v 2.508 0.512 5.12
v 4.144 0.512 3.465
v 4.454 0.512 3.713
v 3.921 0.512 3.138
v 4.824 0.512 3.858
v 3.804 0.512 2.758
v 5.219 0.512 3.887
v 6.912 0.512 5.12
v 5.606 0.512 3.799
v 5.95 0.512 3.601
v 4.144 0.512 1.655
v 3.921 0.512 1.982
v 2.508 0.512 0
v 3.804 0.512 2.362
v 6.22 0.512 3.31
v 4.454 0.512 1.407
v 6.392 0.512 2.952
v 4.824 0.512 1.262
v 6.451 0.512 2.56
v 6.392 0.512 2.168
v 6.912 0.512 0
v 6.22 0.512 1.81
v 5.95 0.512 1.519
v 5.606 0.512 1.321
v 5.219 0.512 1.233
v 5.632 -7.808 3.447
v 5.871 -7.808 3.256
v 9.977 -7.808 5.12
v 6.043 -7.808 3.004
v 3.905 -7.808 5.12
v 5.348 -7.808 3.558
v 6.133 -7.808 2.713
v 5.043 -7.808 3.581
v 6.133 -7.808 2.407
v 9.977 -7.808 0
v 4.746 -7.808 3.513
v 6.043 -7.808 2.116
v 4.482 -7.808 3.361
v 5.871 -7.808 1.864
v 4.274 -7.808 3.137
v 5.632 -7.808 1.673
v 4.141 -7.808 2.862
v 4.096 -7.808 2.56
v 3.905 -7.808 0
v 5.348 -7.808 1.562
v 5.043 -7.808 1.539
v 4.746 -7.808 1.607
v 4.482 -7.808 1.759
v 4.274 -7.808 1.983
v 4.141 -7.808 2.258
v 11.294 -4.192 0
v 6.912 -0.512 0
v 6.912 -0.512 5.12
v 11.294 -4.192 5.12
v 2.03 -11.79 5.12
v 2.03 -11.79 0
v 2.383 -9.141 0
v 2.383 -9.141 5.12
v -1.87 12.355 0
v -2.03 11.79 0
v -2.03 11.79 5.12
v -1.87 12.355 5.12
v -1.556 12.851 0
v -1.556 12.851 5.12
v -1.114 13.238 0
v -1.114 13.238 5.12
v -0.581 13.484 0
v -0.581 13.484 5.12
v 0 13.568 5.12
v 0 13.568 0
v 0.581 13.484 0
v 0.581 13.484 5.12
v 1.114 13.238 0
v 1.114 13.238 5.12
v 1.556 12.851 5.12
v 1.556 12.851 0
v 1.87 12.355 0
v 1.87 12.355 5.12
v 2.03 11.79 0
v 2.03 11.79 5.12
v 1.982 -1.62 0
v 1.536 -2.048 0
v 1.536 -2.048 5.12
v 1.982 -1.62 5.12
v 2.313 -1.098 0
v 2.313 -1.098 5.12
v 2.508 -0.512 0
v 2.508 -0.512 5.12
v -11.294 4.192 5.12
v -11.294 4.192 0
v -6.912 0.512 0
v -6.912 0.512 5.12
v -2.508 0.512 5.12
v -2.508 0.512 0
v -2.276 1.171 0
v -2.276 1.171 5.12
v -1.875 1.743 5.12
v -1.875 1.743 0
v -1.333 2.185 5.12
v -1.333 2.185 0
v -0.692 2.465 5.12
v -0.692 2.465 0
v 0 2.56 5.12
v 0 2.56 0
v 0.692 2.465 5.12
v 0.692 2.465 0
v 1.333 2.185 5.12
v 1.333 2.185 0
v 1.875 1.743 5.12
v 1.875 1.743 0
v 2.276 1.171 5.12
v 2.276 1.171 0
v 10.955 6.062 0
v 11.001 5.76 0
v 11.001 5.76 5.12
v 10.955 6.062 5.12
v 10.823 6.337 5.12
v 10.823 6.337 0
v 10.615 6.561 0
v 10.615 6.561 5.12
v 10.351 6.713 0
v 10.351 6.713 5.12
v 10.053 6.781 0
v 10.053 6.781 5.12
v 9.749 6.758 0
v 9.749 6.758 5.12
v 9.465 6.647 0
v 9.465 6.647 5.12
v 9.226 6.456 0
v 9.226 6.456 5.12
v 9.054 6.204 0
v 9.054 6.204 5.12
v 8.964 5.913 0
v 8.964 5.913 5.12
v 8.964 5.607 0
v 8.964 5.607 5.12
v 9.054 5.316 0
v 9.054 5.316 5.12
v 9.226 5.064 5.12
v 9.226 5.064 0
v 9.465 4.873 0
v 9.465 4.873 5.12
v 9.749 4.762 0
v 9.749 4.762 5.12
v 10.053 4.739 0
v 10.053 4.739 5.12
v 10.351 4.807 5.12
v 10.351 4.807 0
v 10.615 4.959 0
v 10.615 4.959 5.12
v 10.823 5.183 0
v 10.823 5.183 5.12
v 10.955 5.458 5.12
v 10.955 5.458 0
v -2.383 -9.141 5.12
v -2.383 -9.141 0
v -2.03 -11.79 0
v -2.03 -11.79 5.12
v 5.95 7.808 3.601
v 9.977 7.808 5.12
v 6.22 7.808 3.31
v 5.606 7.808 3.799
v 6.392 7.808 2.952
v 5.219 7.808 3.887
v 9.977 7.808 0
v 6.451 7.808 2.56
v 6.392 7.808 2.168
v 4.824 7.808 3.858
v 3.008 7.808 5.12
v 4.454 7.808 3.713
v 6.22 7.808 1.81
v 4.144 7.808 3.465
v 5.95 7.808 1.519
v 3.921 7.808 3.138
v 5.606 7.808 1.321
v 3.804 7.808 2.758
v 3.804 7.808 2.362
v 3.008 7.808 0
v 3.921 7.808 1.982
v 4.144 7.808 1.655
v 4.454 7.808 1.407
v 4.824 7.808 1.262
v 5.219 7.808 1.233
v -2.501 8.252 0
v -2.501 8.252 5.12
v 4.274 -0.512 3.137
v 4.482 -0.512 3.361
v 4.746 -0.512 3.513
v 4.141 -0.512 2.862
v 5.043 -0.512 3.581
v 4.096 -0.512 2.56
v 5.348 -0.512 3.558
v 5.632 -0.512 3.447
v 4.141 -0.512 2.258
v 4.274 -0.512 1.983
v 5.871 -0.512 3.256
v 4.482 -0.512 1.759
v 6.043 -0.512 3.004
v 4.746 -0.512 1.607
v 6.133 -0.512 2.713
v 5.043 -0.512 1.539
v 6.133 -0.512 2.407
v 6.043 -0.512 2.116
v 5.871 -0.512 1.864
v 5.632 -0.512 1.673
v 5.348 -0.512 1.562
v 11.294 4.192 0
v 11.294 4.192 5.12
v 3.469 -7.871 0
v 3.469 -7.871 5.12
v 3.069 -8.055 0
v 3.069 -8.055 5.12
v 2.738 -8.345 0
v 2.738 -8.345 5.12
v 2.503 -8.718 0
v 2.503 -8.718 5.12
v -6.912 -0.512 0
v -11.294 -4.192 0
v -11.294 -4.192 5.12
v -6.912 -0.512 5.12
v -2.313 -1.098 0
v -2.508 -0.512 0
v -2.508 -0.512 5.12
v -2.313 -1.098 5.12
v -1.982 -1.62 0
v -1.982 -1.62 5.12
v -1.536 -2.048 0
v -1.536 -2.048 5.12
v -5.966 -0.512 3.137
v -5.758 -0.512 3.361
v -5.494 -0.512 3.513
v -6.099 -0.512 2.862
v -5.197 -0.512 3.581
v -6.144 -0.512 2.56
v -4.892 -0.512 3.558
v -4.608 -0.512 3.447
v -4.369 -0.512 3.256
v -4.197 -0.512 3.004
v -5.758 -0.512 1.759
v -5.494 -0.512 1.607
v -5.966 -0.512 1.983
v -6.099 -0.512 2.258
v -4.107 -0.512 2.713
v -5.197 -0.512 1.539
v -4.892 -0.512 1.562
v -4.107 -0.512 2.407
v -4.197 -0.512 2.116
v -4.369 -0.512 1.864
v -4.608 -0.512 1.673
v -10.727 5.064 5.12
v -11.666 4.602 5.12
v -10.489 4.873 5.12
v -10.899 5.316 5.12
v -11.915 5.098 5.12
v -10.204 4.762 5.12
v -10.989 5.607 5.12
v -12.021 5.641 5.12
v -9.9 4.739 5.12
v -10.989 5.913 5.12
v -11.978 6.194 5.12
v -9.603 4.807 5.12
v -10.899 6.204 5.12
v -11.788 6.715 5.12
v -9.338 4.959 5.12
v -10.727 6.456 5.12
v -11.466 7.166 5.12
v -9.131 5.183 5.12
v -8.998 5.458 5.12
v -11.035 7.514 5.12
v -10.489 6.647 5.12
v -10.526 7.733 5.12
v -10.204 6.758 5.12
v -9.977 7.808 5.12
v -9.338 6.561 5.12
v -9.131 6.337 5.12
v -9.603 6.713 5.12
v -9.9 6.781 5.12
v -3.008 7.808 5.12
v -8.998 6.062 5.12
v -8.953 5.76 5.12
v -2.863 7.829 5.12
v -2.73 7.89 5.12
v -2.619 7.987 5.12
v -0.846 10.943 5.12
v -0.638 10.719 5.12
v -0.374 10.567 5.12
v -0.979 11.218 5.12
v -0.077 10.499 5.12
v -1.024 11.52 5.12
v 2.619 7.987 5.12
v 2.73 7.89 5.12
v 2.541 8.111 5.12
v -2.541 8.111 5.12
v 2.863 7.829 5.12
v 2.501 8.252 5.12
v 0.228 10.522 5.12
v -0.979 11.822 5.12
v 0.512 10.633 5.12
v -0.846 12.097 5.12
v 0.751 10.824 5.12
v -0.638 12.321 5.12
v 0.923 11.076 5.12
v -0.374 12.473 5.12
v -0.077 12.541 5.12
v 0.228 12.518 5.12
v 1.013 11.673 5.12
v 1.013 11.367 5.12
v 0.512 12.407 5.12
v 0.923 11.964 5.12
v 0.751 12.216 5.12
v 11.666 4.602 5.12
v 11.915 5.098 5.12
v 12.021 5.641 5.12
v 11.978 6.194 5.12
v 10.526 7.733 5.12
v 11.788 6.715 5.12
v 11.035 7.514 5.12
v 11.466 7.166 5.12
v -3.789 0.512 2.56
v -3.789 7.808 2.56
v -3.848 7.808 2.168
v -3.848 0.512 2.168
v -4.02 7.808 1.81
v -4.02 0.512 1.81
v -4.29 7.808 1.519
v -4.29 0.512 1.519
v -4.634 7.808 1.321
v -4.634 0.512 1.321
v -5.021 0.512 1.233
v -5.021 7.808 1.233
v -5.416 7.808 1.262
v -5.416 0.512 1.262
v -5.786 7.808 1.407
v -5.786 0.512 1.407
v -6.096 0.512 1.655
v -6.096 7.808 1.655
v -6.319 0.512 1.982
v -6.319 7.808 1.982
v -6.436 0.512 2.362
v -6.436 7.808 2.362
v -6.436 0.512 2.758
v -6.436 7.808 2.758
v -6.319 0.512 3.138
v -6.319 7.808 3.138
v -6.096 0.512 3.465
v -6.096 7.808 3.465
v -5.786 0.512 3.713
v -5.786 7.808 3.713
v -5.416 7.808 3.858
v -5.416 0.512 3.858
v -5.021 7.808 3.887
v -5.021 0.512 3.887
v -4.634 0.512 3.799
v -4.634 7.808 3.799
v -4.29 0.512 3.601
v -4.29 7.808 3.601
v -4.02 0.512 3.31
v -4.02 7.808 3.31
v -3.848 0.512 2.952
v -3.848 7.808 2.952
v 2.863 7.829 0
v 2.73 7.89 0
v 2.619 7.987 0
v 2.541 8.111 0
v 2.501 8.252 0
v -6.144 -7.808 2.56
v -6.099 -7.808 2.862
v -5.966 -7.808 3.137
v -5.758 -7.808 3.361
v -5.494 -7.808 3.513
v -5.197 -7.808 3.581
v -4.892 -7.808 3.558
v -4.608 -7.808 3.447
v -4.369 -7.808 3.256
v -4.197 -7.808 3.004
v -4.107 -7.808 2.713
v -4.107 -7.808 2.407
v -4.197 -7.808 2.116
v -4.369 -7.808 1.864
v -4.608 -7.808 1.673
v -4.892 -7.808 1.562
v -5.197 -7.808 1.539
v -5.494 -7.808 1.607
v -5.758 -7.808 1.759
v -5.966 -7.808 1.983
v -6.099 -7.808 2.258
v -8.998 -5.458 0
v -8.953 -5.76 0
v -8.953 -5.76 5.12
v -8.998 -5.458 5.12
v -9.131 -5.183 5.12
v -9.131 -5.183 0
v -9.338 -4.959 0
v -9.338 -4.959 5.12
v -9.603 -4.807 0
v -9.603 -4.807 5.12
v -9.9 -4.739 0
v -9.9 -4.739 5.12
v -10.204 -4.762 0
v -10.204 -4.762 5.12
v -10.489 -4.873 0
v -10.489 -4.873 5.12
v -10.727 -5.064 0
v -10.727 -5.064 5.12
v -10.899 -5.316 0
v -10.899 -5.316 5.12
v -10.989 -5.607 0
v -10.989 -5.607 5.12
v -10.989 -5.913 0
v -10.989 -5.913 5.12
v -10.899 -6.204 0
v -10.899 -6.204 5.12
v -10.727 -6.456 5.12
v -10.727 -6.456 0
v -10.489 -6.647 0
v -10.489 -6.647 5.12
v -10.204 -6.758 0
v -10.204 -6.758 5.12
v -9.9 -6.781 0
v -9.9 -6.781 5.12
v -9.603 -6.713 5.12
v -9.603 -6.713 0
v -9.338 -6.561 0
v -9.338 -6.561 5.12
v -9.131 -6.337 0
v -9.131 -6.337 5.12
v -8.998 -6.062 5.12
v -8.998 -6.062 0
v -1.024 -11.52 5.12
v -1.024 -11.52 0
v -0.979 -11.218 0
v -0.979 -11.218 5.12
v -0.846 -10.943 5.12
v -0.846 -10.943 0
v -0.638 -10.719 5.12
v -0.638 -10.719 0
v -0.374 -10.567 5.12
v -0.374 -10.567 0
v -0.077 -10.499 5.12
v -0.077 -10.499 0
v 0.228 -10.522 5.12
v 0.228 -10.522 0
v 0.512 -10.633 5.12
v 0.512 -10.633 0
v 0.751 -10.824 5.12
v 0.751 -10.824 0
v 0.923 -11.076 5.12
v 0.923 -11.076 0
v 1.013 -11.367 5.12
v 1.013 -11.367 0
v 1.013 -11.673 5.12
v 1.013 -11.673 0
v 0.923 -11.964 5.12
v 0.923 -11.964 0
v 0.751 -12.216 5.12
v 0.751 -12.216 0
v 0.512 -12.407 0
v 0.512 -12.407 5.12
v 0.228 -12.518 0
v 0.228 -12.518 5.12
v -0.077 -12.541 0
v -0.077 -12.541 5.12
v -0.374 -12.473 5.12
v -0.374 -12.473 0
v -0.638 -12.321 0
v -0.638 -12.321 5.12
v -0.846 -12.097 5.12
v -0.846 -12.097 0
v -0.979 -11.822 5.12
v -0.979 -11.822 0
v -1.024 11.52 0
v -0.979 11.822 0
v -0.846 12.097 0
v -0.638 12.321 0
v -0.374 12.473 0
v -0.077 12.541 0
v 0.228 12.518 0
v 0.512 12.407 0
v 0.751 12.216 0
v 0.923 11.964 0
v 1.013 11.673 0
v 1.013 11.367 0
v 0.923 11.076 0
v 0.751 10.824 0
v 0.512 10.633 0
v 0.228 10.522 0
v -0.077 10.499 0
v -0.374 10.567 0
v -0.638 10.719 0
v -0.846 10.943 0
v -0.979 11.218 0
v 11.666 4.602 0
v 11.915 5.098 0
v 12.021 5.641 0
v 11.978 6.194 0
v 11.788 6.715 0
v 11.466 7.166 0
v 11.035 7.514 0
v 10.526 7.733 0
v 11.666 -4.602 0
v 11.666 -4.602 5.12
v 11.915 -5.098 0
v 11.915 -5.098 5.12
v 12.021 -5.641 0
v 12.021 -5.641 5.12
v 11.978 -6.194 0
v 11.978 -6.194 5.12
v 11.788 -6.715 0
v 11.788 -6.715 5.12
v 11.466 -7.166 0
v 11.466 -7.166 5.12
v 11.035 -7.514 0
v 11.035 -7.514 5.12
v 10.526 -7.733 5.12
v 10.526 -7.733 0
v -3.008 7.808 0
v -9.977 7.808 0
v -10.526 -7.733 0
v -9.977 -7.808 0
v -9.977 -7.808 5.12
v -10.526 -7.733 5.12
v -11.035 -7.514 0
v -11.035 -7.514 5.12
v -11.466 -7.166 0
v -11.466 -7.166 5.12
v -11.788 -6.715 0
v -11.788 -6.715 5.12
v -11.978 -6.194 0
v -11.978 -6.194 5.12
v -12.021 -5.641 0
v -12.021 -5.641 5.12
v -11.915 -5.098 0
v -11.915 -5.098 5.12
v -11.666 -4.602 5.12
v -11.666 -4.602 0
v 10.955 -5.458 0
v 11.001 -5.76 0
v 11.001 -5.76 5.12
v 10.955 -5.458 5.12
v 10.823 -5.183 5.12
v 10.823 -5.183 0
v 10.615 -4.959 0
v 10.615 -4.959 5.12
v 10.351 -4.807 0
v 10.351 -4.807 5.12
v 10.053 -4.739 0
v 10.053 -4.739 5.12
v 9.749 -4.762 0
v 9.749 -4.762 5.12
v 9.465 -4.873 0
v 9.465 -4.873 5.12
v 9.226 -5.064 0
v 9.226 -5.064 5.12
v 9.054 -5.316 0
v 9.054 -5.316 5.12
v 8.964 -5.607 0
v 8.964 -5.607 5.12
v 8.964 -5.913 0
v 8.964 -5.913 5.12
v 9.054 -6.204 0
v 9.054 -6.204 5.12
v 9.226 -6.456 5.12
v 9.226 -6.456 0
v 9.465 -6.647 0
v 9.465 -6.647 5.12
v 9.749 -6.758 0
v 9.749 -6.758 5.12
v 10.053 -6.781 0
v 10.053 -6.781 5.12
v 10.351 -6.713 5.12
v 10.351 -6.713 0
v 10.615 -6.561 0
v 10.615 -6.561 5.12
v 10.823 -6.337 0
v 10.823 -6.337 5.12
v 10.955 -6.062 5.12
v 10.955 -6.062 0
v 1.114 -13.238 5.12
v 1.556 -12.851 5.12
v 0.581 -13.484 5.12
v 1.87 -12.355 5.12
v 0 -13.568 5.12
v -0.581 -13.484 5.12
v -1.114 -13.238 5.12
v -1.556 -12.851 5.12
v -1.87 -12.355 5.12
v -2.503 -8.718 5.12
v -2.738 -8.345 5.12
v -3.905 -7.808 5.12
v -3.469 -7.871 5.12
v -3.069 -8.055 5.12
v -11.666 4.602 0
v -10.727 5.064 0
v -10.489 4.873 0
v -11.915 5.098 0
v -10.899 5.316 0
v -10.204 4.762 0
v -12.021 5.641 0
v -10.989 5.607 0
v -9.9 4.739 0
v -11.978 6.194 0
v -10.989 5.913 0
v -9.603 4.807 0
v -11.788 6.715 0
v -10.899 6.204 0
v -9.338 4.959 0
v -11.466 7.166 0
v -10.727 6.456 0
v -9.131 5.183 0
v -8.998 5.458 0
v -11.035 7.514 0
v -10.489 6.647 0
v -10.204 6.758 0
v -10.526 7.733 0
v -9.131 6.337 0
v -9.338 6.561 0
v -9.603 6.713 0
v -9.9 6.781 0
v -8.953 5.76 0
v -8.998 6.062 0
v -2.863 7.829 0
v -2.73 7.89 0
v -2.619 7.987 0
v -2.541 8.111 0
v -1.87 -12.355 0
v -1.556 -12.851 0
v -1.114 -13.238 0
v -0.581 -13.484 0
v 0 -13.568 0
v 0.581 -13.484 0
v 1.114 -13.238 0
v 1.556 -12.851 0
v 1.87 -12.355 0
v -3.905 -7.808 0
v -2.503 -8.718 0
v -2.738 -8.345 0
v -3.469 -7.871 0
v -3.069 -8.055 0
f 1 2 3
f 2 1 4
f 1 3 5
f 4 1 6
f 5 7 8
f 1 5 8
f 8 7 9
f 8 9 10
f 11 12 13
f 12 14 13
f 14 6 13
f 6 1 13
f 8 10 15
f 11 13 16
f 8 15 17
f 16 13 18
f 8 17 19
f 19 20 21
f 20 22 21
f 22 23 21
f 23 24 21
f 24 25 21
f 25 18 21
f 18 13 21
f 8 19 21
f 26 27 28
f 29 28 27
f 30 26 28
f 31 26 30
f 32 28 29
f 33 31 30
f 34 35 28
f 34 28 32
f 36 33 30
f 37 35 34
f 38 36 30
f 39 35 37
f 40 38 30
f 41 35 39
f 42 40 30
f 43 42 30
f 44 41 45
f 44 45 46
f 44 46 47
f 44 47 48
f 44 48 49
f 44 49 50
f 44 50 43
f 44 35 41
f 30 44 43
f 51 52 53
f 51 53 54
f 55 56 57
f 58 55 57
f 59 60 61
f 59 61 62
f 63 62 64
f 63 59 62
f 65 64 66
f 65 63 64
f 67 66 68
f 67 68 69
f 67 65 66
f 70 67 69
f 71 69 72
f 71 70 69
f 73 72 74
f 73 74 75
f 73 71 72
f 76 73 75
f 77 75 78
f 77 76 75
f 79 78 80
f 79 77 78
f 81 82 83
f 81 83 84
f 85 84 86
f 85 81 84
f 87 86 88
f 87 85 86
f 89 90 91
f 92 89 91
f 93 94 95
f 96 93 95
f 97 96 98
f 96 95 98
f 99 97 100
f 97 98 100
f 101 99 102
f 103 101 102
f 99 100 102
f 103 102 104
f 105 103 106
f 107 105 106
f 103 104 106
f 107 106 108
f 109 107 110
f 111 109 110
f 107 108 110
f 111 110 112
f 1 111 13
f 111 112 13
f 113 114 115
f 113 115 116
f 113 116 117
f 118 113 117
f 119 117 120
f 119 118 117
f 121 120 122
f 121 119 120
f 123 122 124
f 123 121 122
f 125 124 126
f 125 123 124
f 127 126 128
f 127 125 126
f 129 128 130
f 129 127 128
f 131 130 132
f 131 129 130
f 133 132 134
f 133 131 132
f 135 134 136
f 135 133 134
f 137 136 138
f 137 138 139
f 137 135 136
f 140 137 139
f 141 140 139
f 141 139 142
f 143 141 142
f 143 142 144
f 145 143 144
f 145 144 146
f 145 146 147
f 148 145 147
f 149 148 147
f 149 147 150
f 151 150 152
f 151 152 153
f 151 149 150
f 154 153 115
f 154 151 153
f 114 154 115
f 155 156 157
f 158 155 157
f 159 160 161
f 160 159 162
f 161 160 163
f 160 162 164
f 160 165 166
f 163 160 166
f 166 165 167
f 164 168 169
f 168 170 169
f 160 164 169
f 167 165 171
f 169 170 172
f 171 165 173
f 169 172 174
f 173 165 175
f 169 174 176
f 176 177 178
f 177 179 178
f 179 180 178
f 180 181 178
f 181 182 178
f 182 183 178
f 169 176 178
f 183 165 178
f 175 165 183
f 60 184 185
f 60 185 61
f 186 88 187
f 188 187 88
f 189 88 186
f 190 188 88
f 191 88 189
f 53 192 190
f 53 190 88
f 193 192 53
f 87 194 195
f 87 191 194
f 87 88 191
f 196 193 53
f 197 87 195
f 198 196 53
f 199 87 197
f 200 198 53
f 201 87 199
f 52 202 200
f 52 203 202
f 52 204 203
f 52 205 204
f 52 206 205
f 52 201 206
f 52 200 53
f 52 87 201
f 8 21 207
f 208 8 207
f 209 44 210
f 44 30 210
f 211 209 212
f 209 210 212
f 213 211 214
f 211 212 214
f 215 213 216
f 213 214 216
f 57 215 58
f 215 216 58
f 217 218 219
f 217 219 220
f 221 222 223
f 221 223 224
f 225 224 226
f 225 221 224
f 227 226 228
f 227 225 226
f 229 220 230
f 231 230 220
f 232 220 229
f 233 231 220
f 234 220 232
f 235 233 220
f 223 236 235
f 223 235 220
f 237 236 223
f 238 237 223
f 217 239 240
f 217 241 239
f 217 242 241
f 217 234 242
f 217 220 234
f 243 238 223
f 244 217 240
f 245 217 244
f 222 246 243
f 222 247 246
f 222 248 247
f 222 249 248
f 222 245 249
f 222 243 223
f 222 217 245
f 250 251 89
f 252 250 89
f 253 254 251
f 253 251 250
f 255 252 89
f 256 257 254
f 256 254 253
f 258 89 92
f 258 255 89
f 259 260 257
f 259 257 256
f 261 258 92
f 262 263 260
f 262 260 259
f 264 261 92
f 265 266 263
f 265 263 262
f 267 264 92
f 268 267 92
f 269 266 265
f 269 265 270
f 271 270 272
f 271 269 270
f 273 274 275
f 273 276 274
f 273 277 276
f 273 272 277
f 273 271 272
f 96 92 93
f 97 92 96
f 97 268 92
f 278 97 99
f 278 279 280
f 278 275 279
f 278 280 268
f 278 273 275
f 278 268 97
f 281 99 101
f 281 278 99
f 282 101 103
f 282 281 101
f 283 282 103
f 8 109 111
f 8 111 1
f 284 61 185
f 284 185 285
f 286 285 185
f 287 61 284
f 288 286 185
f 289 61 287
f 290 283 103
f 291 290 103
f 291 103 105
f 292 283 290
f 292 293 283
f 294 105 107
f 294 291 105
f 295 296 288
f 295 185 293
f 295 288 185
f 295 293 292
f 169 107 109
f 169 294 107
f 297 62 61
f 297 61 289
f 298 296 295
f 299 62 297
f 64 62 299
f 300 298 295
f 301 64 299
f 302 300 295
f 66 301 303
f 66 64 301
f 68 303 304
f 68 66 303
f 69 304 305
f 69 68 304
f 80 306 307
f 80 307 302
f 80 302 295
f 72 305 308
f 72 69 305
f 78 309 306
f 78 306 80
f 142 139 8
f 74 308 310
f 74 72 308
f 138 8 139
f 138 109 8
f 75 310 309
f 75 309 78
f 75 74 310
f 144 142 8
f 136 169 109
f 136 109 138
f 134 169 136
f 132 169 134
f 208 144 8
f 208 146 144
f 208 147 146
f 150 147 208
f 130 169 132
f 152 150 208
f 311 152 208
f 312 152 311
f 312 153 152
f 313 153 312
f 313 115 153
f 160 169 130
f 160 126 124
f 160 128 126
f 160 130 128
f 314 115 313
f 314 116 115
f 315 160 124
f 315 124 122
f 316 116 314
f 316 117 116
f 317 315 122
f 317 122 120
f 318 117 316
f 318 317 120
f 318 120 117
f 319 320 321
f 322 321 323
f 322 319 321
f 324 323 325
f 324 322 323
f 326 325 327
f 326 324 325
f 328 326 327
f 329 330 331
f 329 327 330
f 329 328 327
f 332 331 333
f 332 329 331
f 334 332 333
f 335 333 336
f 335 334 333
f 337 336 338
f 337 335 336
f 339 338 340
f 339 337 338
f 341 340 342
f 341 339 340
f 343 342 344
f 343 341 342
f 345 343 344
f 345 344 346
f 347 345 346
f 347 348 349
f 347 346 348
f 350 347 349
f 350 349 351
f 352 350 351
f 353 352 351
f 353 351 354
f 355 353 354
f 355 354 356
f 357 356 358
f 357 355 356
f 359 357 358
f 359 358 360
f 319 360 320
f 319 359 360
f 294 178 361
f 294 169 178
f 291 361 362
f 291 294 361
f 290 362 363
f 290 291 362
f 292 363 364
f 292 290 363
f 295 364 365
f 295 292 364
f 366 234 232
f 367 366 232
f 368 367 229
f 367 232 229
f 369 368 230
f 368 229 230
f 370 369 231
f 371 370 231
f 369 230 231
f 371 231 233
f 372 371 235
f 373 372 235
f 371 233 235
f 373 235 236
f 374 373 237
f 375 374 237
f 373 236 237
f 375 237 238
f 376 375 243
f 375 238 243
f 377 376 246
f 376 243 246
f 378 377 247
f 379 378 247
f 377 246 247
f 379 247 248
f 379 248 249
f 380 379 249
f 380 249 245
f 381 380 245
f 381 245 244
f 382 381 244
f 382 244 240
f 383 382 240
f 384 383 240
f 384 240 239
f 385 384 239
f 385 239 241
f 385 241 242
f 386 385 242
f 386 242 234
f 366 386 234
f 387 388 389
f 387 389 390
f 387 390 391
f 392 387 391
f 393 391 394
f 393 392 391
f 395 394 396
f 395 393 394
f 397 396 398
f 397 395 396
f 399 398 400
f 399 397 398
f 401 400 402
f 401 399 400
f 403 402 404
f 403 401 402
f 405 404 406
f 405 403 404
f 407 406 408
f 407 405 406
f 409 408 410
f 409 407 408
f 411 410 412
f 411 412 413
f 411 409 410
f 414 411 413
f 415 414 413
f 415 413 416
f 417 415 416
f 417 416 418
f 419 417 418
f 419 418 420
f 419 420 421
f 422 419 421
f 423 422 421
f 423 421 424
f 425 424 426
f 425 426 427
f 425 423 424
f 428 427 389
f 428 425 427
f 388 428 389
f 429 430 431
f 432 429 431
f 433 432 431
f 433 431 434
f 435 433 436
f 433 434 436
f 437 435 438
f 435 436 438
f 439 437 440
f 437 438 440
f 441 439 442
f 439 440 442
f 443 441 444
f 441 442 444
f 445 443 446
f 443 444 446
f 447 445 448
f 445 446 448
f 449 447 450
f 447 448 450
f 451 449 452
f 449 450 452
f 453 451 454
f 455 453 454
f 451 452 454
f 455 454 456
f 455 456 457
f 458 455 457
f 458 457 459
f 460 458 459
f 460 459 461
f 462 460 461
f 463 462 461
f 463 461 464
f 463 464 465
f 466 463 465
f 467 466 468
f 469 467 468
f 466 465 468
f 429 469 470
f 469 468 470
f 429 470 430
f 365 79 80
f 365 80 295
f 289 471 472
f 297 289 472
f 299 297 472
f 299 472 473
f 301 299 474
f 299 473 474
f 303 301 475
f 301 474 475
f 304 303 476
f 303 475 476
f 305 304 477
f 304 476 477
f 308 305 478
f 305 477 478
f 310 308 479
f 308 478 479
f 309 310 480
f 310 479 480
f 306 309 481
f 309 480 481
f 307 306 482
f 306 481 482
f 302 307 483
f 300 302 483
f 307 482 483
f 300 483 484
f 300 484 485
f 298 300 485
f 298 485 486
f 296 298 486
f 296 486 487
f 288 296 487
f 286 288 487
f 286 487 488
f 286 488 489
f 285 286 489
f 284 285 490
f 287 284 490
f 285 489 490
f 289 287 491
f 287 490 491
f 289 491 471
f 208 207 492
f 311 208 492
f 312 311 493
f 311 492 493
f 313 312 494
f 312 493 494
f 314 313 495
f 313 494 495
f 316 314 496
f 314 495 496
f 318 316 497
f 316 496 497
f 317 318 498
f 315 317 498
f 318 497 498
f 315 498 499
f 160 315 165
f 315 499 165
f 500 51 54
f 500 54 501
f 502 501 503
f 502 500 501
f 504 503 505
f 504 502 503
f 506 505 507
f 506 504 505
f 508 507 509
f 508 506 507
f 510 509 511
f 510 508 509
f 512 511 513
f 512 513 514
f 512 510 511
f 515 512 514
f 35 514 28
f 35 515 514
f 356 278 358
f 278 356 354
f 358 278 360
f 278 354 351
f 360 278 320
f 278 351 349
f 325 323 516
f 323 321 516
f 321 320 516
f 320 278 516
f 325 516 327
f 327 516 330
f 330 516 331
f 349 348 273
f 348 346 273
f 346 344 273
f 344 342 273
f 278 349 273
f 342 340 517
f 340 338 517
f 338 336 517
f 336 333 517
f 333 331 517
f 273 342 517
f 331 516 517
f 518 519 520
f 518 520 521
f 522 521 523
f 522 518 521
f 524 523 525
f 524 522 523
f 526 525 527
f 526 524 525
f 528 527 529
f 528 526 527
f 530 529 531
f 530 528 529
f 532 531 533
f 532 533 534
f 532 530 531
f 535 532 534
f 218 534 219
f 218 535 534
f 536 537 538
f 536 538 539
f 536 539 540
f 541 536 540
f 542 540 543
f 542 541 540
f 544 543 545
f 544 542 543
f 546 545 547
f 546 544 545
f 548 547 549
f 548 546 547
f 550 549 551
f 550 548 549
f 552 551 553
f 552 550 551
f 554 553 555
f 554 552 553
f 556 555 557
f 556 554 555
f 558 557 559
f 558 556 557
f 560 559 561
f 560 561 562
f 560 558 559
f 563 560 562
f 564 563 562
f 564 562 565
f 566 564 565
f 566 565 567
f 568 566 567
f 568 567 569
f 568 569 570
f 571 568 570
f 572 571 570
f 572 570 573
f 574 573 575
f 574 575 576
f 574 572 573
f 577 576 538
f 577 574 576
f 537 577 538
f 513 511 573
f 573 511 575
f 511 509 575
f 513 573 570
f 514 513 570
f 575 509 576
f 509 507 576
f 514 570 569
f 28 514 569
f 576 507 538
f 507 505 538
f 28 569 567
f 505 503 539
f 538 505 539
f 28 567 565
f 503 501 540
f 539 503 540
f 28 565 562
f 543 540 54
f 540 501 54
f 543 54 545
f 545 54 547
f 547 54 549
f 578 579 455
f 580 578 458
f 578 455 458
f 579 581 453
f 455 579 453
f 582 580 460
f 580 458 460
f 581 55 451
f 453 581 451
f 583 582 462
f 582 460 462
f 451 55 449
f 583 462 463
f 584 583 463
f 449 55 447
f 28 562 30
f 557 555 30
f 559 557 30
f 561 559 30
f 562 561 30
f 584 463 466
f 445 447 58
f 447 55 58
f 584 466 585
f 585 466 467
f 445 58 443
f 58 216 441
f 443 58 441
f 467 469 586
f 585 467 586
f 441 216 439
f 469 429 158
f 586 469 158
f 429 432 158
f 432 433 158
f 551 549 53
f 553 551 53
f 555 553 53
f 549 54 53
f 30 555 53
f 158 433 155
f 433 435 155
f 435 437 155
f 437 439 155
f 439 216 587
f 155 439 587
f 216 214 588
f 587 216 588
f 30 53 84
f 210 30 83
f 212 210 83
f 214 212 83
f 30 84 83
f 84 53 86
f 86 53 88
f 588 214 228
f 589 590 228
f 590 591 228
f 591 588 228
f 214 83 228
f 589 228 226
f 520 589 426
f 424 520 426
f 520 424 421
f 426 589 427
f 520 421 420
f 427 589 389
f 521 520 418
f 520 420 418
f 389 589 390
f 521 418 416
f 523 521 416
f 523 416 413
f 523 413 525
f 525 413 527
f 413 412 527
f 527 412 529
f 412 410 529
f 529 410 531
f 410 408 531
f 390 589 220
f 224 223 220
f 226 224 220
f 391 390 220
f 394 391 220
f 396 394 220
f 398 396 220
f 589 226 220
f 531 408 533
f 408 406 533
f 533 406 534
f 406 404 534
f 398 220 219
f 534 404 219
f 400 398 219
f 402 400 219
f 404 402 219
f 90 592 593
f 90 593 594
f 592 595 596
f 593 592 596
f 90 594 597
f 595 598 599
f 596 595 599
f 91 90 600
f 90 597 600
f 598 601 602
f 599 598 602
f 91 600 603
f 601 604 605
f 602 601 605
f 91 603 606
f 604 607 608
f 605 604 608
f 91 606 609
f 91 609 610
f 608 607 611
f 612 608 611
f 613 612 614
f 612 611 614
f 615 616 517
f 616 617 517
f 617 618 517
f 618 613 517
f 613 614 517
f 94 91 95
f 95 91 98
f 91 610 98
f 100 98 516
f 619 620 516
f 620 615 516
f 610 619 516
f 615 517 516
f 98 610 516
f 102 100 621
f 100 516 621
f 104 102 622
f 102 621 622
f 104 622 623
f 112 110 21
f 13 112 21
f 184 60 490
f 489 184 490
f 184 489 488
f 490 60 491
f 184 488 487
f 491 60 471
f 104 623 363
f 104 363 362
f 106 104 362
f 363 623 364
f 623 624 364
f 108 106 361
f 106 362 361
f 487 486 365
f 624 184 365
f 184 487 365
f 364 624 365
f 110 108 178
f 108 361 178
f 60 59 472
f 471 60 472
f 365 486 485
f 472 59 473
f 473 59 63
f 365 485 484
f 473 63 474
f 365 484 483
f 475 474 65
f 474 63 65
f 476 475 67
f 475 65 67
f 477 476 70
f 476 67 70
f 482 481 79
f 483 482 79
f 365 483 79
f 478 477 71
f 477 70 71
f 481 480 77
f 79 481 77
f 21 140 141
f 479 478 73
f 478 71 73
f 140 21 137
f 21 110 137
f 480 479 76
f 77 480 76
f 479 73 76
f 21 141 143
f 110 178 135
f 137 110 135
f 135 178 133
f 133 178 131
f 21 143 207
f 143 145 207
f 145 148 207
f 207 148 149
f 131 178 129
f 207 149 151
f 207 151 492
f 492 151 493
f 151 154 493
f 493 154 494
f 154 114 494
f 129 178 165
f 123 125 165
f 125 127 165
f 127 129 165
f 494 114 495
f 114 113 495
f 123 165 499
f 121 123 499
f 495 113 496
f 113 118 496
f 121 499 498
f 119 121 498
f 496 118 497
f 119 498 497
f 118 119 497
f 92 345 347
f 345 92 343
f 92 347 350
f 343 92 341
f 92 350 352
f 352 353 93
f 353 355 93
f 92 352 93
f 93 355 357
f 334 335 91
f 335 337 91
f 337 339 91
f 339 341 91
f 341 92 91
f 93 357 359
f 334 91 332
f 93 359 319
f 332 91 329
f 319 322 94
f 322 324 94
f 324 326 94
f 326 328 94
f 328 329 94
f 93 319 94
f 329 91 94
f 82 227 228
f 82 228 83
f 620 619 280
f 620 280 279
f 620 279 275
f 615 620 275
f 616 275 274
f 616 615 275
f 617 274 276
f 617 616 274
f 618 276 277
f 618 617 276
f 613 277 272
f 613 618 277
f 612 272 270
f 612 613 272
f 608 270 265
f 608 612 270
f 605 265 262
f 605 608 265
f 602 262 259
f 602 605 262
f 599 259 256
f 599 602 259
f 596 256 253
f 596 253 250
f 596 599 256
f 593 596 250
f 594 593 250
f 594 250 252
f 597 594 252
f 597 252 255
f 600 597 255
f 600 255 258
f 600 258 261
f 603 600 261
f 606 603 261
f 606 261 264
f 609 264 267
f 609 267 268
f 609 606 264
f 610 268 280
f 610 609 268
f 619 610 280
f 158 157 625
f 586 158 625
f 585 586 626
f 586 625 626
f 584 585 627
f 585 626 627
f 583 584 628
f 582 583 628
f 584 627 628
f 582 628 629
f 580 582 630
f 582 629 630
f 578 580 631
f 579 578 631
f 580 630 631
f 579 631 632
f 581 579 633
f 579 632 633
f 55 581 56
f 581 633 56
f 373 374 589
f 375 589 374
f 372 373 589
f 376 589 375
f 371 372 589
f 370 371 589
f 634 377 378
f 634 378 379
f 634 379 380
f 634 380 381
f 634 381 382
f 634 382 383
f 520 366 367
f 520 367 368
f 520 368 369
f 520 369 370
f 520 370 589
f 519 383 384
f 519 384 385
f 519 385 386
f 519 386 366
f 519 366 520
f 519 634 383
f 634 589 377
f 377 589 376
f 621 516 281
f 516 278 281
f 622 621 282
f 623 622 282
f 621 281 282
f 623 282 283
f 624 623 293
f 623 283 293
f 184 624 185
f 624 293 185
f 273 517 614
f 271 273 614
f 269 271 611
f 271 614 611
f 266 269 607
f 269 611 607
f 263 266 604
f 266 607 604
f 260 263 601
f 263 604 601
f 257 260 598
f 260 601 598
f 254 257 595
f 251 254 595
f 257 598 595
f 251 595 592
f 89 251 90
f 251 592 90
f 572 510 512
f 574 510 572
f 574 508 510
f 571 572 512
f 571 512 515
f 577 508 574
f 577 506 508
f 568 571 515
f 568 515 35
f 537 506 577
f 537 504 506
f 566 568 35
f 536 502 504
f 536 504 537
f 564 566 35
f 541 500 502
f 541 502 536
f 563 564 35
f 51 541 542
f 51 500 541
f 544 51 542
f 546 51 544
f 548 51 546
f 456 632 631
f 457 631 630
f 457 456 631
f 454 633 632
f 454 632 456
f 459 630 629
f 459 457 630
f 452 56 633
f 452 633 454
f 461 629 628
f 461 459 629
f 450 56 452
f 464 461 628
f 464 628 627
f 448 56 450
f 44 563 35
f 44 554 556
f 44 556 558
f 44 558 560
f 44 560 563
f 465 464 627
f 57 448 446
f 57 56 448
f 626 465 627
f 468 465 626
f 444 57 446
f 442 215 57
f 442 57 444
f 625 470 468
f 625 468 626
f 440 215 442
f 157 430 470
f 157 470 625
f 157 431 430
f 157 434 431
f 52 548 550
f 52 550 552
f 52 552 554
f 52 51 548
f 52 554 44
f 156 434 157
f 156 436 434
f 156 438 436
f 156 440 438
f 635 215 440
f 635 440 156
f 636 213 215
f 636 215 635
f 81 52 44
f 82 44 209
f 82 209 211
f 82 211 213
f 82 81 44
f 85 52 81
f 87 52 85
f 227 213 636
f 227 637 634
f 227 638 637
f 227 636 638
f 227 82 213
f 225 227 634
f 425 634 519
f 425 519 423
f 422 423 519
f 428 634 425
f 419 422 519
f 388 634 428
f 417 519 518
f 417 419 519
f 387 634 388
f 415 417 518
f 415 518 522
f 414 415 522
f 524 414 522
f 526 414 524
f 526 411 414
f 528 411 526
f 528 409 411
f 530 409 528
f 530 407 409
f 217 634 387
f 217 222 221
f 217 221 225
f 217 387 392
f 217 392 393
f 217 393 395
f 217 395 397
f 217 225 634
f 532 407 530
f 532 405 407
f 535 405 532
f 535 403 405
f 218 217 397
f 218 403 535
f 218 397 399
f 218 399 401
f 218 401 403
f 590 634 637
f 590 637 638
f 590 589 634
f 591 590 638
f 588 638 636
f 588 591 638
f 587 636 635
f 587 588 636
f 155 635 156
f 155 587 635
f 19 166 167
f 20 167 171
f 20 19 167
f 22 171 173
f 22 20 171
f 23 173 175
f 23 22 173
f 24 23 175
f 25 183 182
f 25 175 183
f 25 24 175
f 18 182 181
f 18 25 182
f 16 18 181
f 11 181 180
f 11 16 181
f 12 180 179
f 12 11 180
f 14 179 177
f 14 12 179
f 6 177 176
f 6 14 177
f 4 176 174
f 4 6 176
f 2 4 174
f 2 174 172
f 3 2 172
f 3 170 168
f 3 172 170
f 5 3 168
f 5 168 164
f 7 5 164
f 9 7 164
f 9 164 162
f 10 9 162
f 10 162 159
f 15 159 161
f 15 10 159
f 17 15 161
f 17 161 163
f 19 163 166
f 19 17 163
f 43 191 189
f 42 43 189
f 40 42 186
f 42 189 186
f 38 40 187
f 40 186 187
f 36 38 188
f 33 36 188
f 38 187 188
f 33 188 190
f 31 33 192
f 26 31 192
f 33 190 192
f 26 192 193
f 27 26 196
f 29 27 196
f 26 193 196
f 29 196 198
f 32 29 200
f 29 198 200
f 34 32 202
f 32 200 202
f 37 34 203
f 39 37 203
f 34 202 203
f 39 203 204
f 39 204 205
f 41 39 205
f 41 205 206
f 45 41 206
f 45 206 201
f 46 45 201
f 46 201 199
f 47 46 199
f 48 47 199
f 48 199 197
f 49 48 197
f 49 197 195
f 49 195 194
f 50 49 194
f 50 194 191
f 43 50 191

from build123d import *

# Parameters (mm, degrees)
SKETCH_1_R               = 2
EXTRUDE_1_DEPTH          = 10
EXTRUDE_1_2_DEPTH        = 10
CUT_EXTRUDE_2_DEPTH      = 40.772126831
CUT_EXTRUDE_2_DEPTH_BACK = 14.25
SKETCH_3_R               = 2.6
SKETCH_4_R               = 2
CUT_EXTRUDE_3_DEPTH      = 40.772126831
SKETCH_5_R               = 2
EXTRUDE_2_DEPTH          = 10
FILLET_1_R               = 3
FILLET_2_R               = 1
SCALE_1_SCALE            = 0.8
SCALE_2_SCALE            = 0.8
SCALE_3_SCALE            = 0.8


with BuildPart() as part:
    # 草图1 → 凸台-拉伸1 (new body)
    with BuildSketch(Plane.XY):
        with BuildLine():
            Line((-3, -4), (3, -4))
            ThreePointArc((3, -4), (4.224744871, -2.674234614), (4.898979486, -1))
            Line((4.898979486, -1), (13.5, -1))
            Line((13.5, -1), (22.057956933, -8.186858864))
            ThreePointArc((22.057956933, -8.186858864), (23.244066267, -12.618838094), (19.485571585, -15.25))
            Line((19.485571585, -15.25), (-19.485571585, -15.25))
            ThreePointArc((-19.485571585, -15.25), (-23.244066267, -12.618838094), (-22.057956933, -8.186858864))
            Line((-22.057956933, -8.186858864), (-13.5, -1))
            Line((-13.5, -1), (-4.898979486, -1))
            ThreePointArc((-4.898979486, -1), (-4.224744871, -2.674234614), (-3, -4))
        make_face()
        with Locations((19.485571585, -11.25)):
            Circle(SKETCH_1_R, mode=Mode.SUBTRACT)
        with Locations((-19.485571585, -11.25)):
            Circle(SKETCH_1_R, mode=Mode.SUBTRACT)
    extrude(amount=EXTRUDE_1_DEPTH)

    # 草图4 → 切除-拉伸3 (cut, through all)
    with BuildSketch(Plane(origin=(0, 15.25, 0), x_dir=(1, 0, 0), z_dir=(0, 1, 0))):
        with Locations(Location((10, -5, 0), (0, 0, 180))):
            Circle(SKETCH_4_R)
        with Locations(Location((-10, -5, 0), (0, 0, 180))):
            Circle(SKETCH_4_R)
    extrude(amount=-CUT_EXTRUDE_3_DEPTH, mode=Mode.SUBTRACT)



with BuildPart() as body_2:
    # 草图1 → Extrude 1 2 (new body)
    with BuildSketch(Plane.XY):
        with BuildLine():
            Line((-13.5, 1), (-4.898979486, 1))
            ThreePointArc((-4.898979486, 1), (0, 5), (4.898979486, 1))
            Line((4.898979486, 1), (13.5, 1))
            Line((13.5, 1), (22.057956933, 8.186858864))
            ThreePointArc((22.057956933, 8.186858864), (23.244066267, 12.618838094), (19.485571585, 15.25))
            Line((19.485571585, 15.25), (-19.485571585, 15.25))
            ThreePointArc((-19.485571585, 15.25), (-23.244066267, 12.618838094), (-22.057956933, 8.186858864))
            Line((-22.057956933, 8.186858864), (-13.5, 1))
        make_face()
        with Locations((19.485571585, 11.25)):
            Circle(SKETCH_1_R, mode=Mode.SUBTRACT)
        with Locations((-19.485571585, 11.25)):
            Circle(SKETCH_1_R, mode=Mode.SUBTRACT)
    extrude(amount=EXTRUDE_1_2_DEPTH)

    # 草图3 → 切除-拉伸2 (cut, two sides: drawn at the far end of the back side and taken through both)
    with BuildSketch(Plane(origin=(0, 15.25, 0), x_dir=(1, 0, 0), z_dir=(0, 1, 0)).offset(-CUT_EXTRUDE_2_DEPTH_BACK)):
        with Locations((10, -5)):
            Circle(SKETCH_3_R)
        with Locations((-10, -5)):
            Circle(SKETCH_3_R)
    extrude(amount=CUT_EXTRUDE_2_DEPTH + CUT_EXTRUDE_2_DEPTH_BACK, mode=Mode.SUBTRACT)


with BuildPart() as part_1:
    add(part.part)

    add(body_2.part)  # 凸台-拉伸2 merges body 2
    # 草图5 → 凸台-拉伸2 (add)
    # profile 1 of 2: a face of its own
    with BuildSketch(Plane(origin=(0, 0, 0), x_dir=(-1, 0, 0), z_dir=(0, 0, -1))):
        with BuildLine():
            Line((-3.965049412, -23.027620284), (-5, -15.25))
            Line((-5, -15.25), (5, -15.25))
            Line((5, -15.25), (3.965049412, -23.027620284))
            ThreePointArc((3.965049412, -23.027620284), (0, -26.5), (-3.965049412, -23.027620284))
        make_face()
        with Locations((0, -22.5)):
            Circle(SKETCH_5_R, mode=Mode.SUBTRACT)
    # profile 2 of 2: a face of its own
    with BuildSketch(Plane(origin=(0, 0, 0), x_dir=(-1, 0, 0), z_dir=(0, 0, -1))):
        with BuildLine():
            Line((5, 15.25), (3.965049412, 23.027620284))
            ThreePointArc((3.965049412, 23.027620284), (0, 26.5), (-3.965049412, 23.027620284))
            Line((-3.965049412, 23.027620284), (-5, 15.25))
            Line((-5, 15.25), (5, 15.25))
        make_face()
        with Locations((0, 22.5)):
            Circle(SKETCH_5_R, mode=Mode.SUBTRACT)
    extrude(amount=-EXTRUDE_2_DEPTH)

    # 圆角1
    fillet_1_edges = [part_1.edges().sort_by_distance(p)[0] for p in [
        (-5, -15.25, 5),
        (5, -15.25, 5),
    ]]
    fillet(fillet_1_edges, radius=FILLET_1_R)

    # 圆角2
    fillet_2_edges = [part_1.edges().sort_by_distance(p)[0] for p in [
        (5, 15.25, 5),
        (-5, 15.25, 5),
    ]]
    fillet(fillet_2_edges, radius=FILLET_2_R)


with BuildPart() as part_2:
    # 缩放比例1: scaled about (0, 0, 0)
    add(part_1.part.scale(SCALE_1_SCALE))


with BuildPart() as part_3:
    # 缩放比例2: scaled about (0, 0, 0)
    add(part_2.part.scale(SCALE_2_SCALE))


with BuildPart() as part_4:
    # 缩放比例3: scaled about (0, 0, 0)
    add(part_3.part.scale(SCALE_3_SCALE))


solid = part_4.part
